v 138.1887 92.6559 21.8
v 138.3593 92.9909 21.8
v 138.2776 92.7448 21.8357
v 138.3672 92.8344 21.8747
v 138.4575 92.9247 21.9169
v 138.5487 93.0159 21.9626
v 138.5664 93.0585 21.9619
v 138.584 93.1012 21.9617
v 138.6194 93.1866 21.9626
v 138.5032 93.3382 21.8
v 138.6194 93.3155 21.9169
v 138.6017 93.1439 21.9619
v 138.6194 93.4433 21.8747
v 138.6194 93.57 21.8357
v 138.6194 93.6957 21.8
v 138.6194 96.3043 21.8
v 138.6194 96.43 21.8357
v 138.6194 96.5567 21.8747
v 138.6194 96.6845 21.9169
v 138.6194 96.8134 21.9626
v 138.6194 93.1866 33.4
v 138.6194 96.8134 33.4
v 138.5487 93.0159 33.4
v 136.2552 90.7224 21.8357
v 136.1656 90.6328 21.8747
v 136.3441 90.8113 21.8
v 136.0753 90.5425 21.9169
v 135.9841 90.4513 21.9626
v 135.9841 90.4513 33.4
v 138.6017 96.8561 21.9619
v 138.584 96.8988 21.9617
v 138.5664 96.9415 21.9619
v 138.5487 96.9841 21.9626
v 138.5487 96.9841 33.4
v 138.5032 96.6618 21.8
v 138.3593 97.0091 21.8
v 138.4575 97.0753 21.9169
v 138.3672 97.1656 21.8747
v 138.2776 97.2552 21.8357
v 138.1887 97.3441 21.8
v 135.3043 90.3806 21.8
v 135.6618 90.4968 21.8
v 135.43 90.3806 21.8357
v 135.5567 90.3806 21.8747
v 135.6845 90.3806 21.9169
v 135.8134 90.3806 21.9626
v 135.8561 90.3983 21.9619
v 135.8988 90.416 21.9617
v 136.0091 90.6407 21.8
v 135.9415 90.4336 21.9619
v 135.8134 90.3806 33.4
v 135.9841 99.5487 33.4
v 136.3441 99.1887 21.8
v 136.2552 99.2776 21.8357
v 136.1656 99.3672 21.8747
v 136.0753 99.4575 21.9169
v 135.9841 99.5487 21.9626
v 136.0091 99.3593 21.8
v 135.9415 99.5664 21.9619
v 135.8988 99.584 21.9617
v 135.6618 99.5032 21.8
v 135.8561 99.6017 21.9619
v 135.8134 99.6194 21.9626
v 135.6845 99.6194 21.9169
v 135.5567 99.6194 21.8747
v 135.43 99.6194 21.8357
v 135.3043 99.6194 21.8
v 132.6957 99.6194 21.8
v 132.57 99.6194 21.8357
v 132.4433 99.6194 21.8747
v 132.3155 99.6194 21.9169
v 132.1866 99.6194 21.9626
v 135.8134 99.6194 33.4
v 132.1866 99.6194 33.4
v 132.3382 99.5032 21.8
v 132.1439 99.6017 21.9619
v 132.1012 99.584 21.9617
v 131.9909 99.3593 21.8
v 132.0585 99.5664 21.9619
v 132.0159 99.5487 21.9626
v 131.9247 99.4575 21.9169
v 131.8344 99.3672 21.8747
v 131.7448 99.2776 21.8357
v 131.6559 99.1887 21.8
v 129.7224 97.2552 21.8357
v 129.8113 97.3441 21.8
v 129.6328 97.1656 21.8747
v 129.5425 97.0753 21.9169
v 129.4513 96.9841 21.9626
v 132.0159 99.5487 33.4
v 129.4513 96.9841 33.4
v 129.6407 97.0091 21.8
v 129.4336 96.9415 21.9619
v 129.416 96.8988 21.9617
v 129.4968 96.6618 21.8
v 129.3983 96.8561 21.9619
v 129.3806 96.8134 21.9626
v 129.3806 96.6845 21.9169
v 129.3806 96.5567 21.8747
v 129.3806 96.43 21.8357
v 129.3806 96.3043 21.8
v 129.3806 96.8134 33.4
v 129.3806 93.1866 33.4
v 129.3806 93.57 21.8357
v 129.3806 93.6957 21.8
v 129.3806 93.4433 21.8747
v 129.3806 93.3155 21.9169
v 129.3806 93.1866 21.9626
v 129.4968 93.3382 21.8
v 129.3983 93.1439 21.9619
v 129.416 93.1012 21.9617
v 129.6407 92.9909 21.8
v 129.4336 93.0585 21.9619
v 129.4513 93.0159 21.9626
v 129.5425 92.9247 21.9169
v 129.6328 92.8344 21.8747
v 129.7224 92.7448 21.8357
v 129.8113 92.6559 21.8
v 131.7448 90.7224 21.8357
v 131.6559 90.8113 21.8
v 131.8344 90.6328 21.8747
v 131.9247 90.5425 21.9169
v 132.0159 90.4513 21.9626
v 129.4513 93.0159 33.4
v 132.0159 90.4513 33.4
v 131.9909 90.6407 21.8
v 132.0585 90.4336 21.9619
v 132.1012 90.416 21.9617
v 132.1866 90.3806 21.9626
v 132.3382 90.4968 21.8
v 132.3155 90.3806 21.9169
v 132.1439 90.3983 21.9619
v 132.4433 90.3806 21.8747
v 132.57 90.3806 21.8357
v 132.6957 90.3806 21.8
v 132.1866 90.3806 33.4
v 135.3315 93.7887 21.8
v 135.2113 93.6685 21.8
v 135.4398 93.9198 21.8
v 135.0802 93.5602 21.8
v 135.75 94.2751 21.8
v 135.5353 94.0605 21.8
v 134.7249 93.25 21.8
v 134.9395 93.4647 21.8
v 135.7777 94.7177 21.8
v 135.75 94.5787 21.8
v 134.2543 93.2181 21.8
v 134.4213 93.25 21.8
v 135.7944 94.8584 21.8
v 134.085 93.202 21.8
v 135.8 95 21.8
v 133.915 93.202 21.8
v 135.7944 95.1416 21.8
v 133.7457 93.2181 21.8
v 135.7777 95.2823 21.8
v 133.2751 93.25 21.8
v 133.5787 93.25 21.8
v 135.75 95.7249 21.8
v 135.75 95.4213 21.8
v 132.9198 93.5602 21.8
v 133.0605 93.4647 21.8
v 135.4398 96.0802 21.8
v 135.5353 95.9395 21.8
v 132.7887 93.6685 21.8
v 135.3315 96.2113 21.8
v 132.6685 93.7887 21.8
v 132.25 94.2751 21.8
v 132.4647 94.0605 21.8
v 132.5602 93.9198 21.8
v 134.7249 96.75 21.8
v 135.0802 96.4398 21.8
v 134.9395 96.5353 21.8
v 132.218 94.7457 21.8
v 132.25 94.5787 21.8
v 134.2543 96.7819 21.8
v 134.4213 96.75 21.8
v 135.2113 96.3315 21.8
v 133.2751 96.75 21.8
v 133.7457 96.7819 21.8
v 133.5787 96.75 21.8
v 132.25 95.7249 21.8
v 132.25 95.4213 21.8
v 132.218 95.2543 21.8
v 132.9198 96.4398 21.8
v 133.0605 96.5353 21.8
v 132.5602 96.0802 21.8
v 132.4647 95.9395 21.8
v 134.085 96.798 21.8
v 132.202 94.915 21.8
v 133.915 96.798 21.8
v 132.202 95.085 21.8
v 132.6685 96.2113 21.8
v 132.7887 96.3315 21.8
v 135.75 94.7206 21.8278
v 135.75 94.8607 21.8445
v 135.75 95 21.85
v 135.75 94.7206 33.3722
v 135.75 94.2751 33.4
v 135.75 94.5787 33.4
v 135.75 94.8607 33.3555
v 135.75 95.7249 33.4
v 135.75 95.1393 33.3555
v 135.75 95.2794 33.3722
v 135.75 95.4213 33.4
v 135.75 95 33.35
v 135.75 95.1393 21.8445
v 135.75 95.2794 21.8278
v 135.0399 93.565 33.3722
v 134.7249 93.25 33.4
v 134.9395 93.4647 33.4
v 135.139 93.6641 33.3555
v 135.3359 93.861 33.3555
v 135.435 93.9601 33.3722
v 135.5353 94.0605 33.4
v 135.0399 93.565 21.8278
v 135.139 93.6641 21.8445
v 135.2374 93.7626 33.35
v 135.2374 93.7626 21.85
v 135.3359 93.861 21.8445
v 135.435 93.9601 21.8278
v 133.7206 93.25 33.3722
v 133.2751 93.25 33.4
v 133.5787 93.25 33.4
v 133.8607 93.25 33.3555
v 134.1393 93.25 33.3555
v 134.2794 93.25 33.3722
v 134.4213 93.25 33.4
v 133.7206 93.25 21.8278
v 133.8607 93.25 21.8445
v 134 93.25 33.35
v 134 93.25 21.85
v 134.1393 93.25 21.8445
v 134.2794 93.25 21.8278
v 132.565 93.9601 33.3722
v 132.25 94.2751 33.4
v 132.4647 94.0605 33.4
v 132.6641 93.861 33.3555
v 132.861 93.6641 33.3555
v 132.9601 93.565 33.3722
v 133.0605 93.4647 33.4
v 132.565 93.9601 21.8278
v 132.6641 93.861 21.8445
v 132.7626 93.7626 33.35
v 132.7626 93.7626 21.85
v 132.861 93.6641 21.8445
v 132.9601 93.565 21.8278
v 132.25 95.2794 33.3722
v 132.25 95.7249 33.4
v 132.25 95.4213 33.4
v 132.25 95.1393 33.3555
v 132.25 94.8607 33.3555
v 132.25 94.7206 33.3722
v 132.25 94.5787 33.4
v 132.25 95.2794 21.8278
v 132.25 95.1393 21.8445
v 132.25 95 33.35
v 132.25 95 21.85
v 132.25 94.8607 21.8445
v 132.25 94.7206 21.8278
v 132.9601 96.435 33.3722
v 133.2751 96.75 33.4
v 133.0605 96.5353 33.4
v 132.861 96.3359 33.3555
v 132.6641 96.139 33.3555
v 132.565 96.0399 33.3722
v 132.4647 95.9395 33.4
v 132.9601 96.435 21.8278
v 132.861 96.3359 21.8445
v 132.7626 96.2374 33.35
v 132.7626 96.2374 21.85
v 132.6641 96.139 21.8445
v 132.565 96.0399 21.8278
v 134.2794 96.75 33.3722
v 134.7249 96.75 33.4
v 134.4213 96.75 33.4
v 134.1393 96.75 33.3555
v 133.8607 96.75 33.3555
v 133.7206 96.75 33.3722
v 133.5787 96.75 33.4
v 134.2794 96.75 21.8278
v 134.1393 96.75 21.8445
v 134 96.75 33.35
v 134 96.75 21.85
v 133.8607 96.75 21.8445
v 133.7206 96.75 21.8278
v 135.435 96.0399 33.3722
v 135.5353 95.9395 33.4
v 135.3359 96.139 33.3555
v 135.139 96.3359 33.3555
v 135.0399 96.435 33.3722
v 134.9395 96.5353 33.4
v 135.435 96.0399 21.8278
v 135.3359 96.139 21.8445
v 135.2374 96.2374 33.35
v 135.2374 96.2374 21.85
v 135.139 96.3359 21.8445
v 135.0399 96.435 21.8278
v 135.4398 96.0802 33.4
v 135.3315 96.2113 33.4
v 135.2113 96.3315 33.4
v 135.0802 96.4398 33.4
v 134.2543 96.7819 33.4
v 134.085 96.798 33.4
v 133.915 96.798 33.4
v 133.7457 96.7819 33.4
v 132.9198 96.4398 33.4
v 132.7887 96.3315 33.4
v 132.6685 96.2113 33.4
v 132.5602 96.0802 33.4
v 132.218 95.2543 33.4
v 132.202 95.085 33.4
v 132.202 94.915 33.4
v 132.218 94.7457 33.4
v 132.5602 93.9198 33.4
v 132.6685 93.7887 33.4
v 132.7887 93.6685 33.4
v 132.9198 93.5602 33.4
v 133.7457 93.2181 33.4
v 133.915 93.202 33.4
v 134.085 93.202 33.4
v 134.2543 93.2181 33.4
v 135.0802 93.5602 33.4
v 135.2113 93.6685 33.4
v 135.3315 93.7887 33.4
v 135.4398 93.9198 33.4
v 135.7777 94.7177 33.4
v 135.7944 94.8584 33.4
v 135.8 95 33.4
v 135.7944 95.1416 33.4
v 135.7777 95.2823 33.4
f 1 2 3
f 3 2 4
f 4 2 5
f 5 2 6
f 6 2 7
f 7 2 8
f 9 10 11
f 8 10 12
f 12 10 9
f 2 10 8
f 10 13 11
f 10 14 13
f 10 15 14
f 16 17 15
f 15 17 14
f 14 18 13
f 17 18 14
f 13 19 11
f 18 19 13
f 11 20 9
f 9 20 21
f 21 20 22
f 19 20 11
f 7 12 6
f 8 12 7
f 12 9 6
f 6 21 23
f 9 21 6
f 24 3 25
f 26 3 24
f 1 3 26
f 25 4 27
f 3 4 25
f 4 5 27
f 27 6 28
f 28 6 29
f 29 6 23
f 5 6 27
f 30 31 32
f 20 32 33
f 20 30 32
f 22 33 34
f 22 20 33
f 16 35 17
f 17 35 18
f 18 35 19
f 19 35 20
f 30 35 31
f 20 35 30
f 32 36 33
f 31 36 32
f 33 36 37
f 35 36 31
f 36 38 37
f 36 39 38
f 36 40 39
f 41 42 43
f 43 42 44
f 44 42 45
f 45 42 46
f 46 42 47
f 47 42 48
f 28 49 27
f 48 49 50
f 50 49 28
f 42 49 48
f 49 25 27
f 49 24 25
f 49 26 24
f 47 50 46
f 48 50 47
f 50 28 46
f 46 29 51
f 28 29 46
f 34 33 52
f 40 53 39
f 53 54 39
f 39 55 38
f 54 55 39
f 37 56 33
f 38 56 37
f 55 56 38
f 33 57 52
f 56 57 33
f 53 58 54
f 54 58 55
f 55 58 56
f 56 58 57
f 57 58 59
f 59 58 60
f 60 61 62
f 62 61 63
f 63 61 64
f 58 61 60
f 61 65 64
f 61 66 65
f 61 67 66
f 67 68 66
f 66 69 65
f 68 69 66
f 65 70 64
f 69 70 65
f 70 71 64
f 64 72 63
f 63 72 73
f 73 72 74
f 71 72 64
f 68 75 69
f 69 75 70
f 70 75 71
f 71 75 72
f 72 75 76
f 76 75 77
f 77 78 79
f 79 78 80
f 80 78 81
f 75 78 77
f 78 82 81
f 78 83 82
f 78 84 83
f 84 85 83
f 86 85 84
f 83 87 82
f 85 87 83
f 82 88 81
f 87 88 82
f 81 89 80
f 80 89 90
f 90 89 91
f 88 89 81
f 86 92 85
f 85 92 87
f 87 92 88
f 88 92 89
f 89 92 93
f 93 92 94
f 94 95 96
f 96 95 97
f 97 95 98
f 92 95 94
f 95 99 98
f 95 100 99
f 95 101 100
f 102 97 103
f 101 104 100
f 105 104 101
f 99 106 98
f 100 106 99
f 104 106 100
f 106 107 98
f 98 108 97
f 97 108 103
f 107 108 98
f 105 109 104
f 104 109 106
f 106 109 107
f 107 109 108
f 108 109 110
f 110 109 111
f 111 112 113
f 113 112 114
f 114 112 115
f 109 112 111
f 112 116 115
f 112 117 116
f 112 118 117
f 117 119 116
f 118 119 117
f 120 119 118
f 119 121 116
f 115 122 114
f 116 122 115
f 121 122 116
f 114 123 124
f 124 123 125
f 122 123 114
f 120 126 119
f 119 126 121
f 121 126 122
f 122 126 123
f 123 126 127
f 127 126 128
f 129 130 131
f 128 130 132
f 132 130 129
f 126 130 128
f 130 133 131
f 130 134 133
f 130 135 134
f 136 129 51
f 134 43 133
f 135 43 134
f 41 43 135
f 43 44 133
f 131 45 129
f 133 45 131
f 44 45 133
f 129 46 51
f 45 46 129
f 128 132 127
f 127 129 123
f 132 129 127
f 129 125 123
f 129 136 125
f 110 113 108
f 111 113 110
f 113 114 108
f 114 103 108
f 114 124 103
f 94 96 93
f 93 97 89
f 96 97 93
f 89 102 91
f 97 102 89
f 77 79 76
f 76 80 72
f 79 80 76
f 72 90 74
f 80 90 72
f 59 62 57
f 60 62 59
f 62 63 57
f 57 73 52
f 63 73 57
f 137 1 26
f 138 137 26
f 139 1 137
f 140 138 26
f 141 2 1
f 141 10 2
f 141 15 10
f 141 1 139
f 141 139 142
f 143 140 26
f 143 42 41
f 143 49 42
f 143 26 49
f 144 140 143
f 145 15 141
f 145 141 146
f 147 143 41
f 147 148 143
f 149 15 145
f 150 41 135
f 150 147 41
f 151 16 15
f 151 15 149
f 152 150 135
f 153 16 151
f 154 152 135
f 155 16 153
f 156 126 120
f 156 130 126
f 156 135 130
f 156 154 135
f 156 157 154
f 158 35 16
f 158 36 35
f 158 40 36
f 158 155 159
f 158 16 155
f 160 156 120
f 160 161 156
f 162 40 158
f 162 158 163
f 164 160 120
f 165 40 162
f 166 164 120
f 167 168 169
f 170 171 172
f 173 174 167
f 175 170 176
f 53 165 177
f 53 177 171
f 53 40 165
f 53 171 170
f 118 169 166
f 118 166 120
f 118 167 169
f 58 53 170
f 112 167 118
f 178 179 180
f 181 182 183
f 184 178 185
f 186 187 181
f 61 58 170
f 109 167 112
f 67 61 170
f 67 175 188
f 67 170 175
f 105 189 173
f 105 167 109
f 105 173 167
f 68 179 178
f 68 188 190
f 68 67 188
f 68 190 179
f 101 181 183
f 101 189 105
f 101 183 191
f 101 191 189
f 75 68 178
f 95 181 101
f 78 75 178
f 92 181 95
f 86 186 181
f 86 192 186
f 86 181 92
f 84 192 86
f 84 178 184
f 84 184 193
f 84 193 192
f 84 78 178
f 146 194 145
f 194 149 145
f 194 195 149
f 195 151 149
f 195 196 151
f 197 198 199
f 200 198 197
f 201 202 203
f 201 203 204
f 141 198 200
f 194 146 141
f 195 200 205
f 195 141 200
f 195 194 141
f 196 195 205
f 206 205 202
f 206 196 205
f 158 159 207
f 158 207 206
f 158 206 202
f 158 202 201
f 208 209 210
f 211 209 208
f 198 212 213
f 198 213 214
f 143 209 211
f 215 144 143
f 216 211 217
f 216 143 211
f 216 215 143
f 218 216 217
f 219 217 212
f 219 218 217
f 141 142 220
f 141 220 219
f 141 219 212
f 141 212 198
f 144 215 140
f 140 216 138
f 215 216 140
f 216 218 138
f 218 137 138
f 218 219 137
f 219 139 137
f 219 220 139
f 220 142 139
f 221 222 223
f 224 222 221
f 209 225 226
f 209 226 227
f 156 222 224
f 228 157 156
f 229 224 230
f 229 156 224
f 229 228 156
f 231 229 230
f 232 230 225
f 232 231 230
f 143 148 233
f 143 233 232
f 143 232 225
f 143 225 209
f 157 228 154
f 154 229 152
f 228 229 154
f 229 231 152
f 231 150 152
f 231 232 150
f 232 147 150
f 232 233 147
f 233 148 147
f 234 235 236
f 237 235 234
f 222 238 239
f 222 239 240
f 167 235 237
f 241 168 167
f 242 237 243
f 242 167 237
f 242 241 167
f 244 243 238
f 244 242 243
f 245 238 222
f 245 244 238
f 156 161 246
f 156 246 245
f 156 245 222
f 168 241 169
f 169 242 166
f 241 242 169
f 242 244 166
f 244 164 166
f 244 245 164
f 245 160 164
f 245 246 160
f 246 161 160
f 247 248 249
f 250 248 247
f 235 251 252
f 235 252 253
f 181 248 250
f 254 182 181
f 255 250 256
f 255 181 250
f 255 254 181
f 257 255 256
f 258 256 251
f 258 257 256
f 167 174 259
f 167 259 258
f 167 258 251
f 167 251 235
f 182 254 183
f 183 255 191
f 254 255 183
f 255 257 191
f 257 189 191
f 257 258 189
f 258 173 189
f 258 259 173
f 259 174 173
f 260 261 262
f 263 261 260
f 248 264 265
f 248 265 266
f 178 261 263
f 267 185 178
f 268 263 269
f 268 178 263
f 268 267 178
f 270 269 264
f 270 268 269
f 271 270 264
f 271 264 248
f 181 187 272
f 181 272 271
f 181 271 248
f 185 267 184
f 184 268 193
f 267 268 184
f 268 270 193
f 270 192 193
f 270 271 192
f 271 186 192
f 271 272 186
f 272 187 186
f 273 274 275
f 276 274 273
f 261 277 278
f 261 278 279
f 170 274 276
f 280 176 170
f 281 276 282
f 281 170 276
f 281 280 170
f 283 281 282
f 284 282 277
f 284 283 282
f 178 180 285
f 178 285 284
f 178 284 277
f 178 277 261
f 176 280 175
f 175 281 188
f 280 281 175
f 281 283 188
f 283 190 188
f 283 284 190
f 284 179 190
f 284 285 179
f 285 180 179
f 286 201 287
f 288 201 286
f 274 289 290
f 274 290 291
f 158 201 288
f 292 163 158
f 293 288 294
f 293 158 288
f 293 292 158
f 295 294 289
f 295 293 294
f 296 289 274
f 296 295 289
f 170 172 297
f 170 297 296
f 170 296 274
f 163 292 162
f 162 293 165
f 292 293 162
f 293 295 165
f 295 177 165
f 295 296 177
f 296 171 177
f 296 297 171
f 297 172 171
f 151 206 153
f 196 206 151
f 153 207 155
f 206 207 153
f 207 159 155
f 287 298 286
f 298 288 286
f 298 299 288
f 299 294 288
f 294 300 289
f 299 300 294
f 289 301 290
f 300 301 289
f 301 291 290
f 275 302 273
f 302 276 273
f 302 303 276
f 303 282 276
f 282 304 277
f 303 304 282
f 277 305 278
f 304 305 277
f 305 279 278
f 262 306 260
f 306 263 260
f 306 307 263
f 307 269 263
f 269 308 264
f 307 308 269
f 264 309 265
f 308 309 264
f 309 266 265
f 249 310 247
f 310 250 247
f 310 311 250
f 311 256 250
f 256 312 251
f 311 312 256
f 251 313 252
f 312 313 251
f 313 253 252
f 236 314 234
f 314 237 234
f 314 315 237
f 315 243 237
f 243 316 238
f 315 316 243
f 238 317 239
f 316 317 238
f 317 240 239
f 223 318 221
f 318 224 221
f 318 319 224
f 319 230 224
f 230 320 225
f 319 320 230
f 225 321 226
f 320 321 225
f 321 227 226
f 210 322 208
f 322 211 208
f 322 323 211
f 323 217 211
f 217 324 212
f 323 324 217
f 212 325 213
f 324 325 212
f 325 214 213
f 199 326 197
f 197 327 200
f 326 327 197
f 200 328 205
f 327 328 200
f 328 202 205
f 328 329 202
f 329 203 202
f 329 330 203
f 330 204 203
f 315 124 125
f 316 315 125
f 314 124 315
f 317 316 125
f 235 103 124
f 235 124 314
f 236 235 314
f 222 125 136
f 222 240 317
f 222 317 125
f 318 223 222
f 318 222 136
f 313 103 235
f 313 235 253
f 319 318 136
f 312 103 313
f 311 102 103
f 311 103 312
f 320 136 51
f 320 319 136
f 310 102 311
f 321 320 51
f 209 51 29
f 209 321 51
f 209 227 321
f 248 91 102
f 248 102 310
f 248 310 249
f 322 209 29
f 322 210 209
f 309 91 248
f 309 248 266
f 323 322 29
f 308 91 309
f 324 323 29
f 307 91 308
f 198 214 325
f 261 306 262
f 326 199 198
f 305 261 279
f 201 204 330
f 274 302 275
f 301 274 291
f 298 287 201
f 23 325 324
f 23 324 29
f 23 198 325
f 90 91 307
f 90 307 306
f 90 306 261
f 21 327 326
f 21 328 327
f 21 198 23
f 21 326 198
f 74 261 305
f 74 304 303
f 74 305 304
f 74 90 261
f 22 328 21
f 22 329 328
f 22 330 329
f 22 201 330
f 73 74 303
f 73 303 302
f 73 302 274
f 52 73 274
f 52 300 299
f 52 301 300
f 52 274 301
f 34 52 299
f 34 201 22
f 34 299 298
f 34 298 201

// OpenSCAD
// Generated by the canonical parent Python sources and validated exchange pipeline.
polyhedron(points=[[138.1886749267578, 92.6558609008789, 21.799999237060547], [138.35928344726562, 92.9908676147461, 21.799999237060547], [138.277587890625, 92.7447738647461, 21.83568000793457], [138.3671875, 92.83436584472656, 21.874652862548828], [138.45753479003906, 92.92471313476562, 21.916948318481445], [138.54869079589844, 93.015869140625, 21.96259117126465], [138.5663604736328, 93.05854797363281, 21.961946487426758], [138.58404541015625, 93.10122680664062, 21.96173095703125], [138.61940002441406, 93.18658447265625, 21.96259117126465], [138.50315856933594, 93.33818817138672, 21.799999237060547], [138.61940002441406, 93.31549835205078, 21.916948318481445], [138.60171508789062, 93.14390563964844, 21.961946487426758], [138.61940002441406, 93.44326782226562, 21.874652862548828], [138.61940002441406, 93.56997680664062, 21.83568000793457], [138.61940002441406, 93.69570922851562, 21.799999237060547], [138.61940002441406, 96.30429077148438, 21.799999237060547], [138.61940002441406, 96.43002319335938, 21.83568000793457], [138.61940002441406, 96.55673217773438, 21.874652862548828], [138.61940002441406, 96.68450164794922, 21.916948318481445], [138.61940002441406, 96.81341552734375, 21.96259117126465], [138.61940002441406, 93.18658447265625, 33.400001525878906], [138.61940002441406, 96.81341552734375, 33.400001525878906], [138.54869079589844, 93.015869140625, 33.400001525878906], [136.25523376464844, 90.722412109375, 21.83568000793457], [136.16563415527344, 90.63282012939453, 21.874652862548828], [136.34413146972656, 90.81132507324219, 21.799999237060547], [136.07528686523438, 90.54247283935547, 21.916948318481445], [135.984130859375, 90.45130920410156, 21.96259117126465], [135.984130859375, 90.45130920410156, 33.400001525878906], [138.60171508789062, 96.85609436035156, 21.961946487426758], [138.58404541015625, 96.89877319335938, 21.96173095703125], [138.5663604736328, 96.94145202636719, 21.961946487426758], [138.54869079589844, 96.984130859375, 21.96259117126465], [138.54869079589844, 96.984130859375, 33.400001525878906], [138.50315856933594, 96.66181182861328, 21.799999237060547], [138.35928344726562, 97.0091323852539, 21.799999237060547], [138.45753479003906, 97.07528686523438, 21.916948318481445], [138.3671875, 97.16563415527344, 21.874652862548828], [138.277587890625, 97.2552261352539, 21.83568000793457], [138.1886749267578, 97.3441390991211, 21.799999237060547], [135.30429077148438, 90.38059997558594, 21.799999237060547], [135.66180419921875, 90.4968490600586, 21.799999237060547], [135.43002319335938, 90.38059997558594, 21.83568000793457], [135.55673217773438, 90.38059997558594, 21.874652862548828], [135.6844940185547, 90.38059997558594, 21.916948318481445], [135.81341552734375, 90.38059997558594, 21.96259117126465], [135.85609436035156, 90.39827728271484, 21.961946487426758], [135.89877319335938, 90.41595458984375, 21.96173095703125], [136.00914001464844, 90.64071655273438, 21.799999237060547], [135.9414520263672, 90.43363189697266, 21.961946487426758], [135.81341552734375, 90.38059997558594, 33.400001525878906], [135.984130859375, 99.54869079589844, 33.400001525878906], [136.34413146972656, 99.18867492675781, 21.799999237060547], [136.25523376464844, 99.277587890625, 21.83568000793457], [136.16563415527344, 99.36717987060547, 21.874652862548828], [136.07528686523438, 99.45752716064453, 21.916948318481445], [135.984130859375, 99.54869079589844, 21.96259117126465], [136.00914001464844, 99.35928344726562, 21.799999237060547], [135.9414520263672, 99.56636810302734, 21.961946487426758], [135.89877319335938, 99.58404541015625, 21.96173095703125], [135.66180419921875, 99.5031509399414, 21.799999237060547], [135.85609436035156, 99.60172271728516, 21.961946487426758], [135.81341552734375, 99.61940002441406, 21.96259117126465], [135.6844940185547, 99.61940002441406, 21.916948318481445], [135.55673217773438, 99.61940002441406, 21.874652862548828], [135.43002319335938, 99.61940002441406, 21.83568000793457], [135.30429077148438, 99.61940002441406, 21.799999237060547], [132.69570922851562, 99.61940002441406, 21.799999237060547], [132.56997680664062, 99.61940002441406, 21.83568000793457], [132.44326782226562, 99.61940002441406, 21.874652862548828], [132.3155059814453, 99.61940002441406, 21.916948318481445], [132.18658447265625, 99.61940002441406, 21.96259117126465], [135.81341552734375, 99.61940002441406, 33.400001525878906], [132.18658447265625, 99.61940002441406, 33.400001525878906], [132.33819580078125, 99.5031509399414, 21.799999237060547], [132.14390563964844, 99.60172271728516, 21.961946487426758], [132.10122680664062, 99.58404541015625, 21.96173095703125], [131.99085998535156, 99.35928344726562, 21.799999237060547], [132.0585479736328, 99.56636810302734, 21.961946487426758], [132.015869140625, 99.54869079589844, 21.96259117126465], [131.92471313476562, 99.45752716064453, 21.916948318481445], [131.83436584472656, 99.36717987060547, 21.874652862548828], [131.74476623535156, 99.277587890625, 21.83568000793457], [131.65586853027344, 99.18867492675781, 21.799999237060547], [129.722412109375, 97.2552261352539, 21.83568000793457], [129.8113250732422, 97.3441390991211, 21.799999237060547], [129.6328125, 97.16563415527344, 21.874652862548828], [129.54246520996094, 97.07528686523438, 21.916948318481445], [129.45130920410156, 96.984130859375, 21.96259117126465], [132.015869140625, 99.54869079589844, 33.400001525878906], [129.45130920410156, 96.984130859375, 33.400001525878906], [129.64071655273438, 97.0091323852539, 21.799999237060547], [129.4336395263672, 96.94145202636719, 21.961946487426758], [129.41595458984375, 96.89877319335938, 21.96173095703125], [129.49684143066406, 96.66181182861328, 21.799999237060547], [129.39828491210938, 96.85609436035156, 21.961946487426758], [129.38059997558594, 96.81341552734375, 21.96259117126465], [129.38059997558594, 96.68450164794922, 21.916948318481445], [129.38059997558594, 96.55673217773438, 21.874652862548828], [129.38059997558594, 96.43002319335938, 21.83568000793457], [129.38059997558594, 96.30429077148438, 21.799999237060547], [129.38059997558594, 96.81341552734375, 33.400001525878906], [129.38059997558594, 93.18658447265625, 33.400001525878906], [129.38059997558594, 93.56997680664062, 21.83568000793457], [129.38059997558594, 93.69570922851562, 21.799999237060547], [129.38059997558594, 93.44326782226562, 21.874652862548828], [129.38059997558594, 93.31549835205078, 21.916948318481445], [129.38059997558594, 93.18658447265625, 21.96259117126465], [129.49684143066406, 93.33818817138672, 21.799999237060547], [129.39828491210938, 93.14390563964844, 21.961946487426758], [129.41595458984375, 93.10122680664062, 21.96173095703125], [129.64071655273438, 92.9908676147461, 21.799999237060547], [129.4336395263672, 93.05854797363281, 21.961946487426758], [129.45130920410156, 93.015869140625, 21.96259117126465], [129.54246520996094, 92.92471313476562, 21.916948318481445], [129.6328125, 92.83436584472656, 21.874652862548828], [129.722412109375, 92.7447738647461, 21.83568000793457], [129.8113250732422, 92.6558609008789, 21.799999237060547], [131.74476623535156, 90.722412109375, 21.83568000793457], [131.65586853027344, 90.81132507324219, 21.799999237060547], [131.83436584472656, 90.63282012939453, 21.874652862548828], [131.92471313476562, 90.54247283935547, 21.916948318481445], [132.015869140625, 90.45130920410156, 21.96259117126465], [129.45130920410156, 93.015869140625, 33.400001525878906], [132.015869140625, 90.45130920410156, 33.400001525878906], [131.99085998535156, 90.64071655273438, 21.799999237060547], [132.0585479736328, 90.43363189697266, 21.961946487426758], [132.10122680664062, 90.41595458984375, 21.96173095703125], [132.18658447265625, 90.38059997558594, 21.96259117126465], [132.33819580078125, 90.4968490600586, 21.799999237060547], [132.3155059814453, 90.38059997558594, 21.916948318481445], [132.14390563964844, 90.39827728271484, 21.961946487426758], [132.44326782226562, 90.38059997558594, 21.874652862548828], [132.56997680664062, 90.38059997558594, 21.83568000793457], [132.69570922851562, 90.38059997558594, 21.799999237060547], [132.18658447265625, 90.38059997558594, 33.400001525878906], [135.33148193359375, 93.78874206542969, 21.799999237060547], [135.2112579345703, 93.66851043701172, 21.799999237060547], [135.43983459472656, 93.91979217529297, 21.799999237060547], [135.08021545410156, 93.5601577758789, 21.799999237060547], [135.75, 94.2751235961914, 21.799999237060547], [135.53533935546875, 94.06047058105469, 21.799999237060547], [134.72486877441406, 93.25, 21.799999237060547], [134.9395294189453, 93.46465301513672, 21.799999237060547], [135.77772521972656, 94.71766662597656, 21.799999237060547], [135.75, 94.57868957519531, 21.799999237060547], [134.25430297851562, 93.21805572509766, 21.799999237060547], [134.4213104248047, 93.25, 21.799999237060547], [135.79441833496094, 94.8583984375, 21.799999237060547], [134.08502197265625, 93.20201110839844, 21.799999237060547], [135.8000030517578, 95.0, 21.799999237060547], [133.91497802734375, 93.20201110839844, 21.799999237060547], [135.79441833496094, 95.1416015625, 21.799999237060547], [133.74569702148438, 93.21805572509766, 21.799999237060547], [135.77772521972656, 95.28233337402344, 21.799999237060547], [133.27513122558594, 93.25, 21.799999237060547], [133.5786895751953, 93.25, 21.799999237060547], [135.75, 95.7248764038086, 21.799999237060547], [135.75, 95.42131042480469, 21.799999237060547], [132.91978454589844, 93.5601577758789, 21.799999237060547], [133.0604705810547, 93.46465301513672, 21.799999237060547], [135.43983459472656, 96.08020782470703, 21.799999237060547], [135.53533935546875, 95.93952941894531, 21.799999237060547], [132.7887420654297, 93.66851043701172, 21.799999237060547], [135.33148193359375, 96.21125793457031, 21.799999237060547], [132.66851806640625, 93.78874206542969, 21.799999237060547], [132.25, 94.2751235961914, 21.799999237060547], [132.46466064453125, 94.06047058105469, 21.799999237060547], [132.56016540527344, 93.91979217529297, 21.799999237060547], [134.72486877441406, 96.75, 21.799999237060547], [135.08021545410156, 96.4398422241211, 21.799999237060547], [134.9395294189453, 96.53534698486328, 21.799999237060547], [132.21804809570312, 94.7457046508789, 21.799999237060547], [132.25, 94.57868957519531, 21.799999237060547], [134.25430297851562, 96.78194427490234, 21.799999237060547], [134.4213104248047, 96.75, 21.799999237060547], [135.2112579345703, 96.33148956298828, 21.799999237060547], [133.27513122558594, 96.75, 21.799999237060547], [133.74569702148438, 96.78194427490234, 21.799999237060547], [133.5786895751953, 96.75, 21.799999237060547], [132.25, 95.7248764038086, 21.799999237060547], [132.25, 95.42131042480469, 21.799999237060547], [132.21804809570312, 95.2542953491211, 21.799999237060547], [132.91978454589844, 96.4398422241211, 21.799999237060547], [133.0604705810547, 96.53534698486328, 21.799999237060547], [132.56016540527344, 96.08020782470703, 21.799999237060547], [132.46466064453125, 95.93952941894531, 21.799999237060547], [134.08502197265625, 96.79798889160156, 21.799999237060547], [132.20201110839844, 94.91497802734375, 21.799999237060547], [133.91497802734375, 96.79798889160156, 21.799999237060547], [132.20201110839844, 95.08502197265625, 21.799999237060547], [132.66851806640625, 96.21125793457031, 21.799999237060547], [132.7887420654297, 96.33148956298828, 21.799999237060547], [135.75, 94.72059631347656, 21.827836990356445], [135.75, 94.8607406616211, 21.844467163085938], [135.75, 95.0, 21.850000381469727], [135.75, 94.72059631347656, 33.37216567993164], [135.75, 94.2751235961914, 33.400001525878906], [135.75, 94.57868957519531, 33.400001525878906], [135.75, 94.8607406616211, 33.355533599853516], [135.75, 95.7248764038086, 33.400001525878906], [135.75, 95.1392593383789, 33.355533599853516], [135.75, 95.27940368652344, 33.37216567993164], [135.75, 95.42131042480469, 33.400001525878906], [135.75, 95.0, 33.349998474121094], [135.75, 95.1392593383789, 21.844467163085938], [135.75, 95.27940368652344, 21.827836990356445], [135.0398712158203, 93.56499481201172, 33.37216567993164], [134.72486877441406, 93.25, 33.400001525878906], [134.9395294189453, 93.46465301513672, 33.400001525878906], [135.1389617919922, 93.66409301757812, 33.355533599853516], [135.33590698242188, 93.86103820800781, 33.355533599853516], [135.43499755859375, 93.96012878417969, 33.37216567993164], [135.53533935546875, 94.06047058105469, 33.400001525878906], [135.0398712158203, 93.56499481201172, 21.827836990356445], [135.1389617919922, 93.66409301757812, 21.844467163085938], [135.23744201660156, 93.76256561279297, 33.349998474121094], [135.23744201660156, 93.76256561279297, 21.850000381469727], [135.33590698242188, 93.86103820800781, 21.844467163085938], [135.43499755859375, 93.96012878417969, 21.827836990356445], [133.72059631347656, 93.25, 33.37216567993164], [133.27513122558594, 93.25, 33.400001525878906], [133.5786895751953, 93.25, 33.400001525878906], [133.86073303222656, 93.25, 33.355533599853516], [134.13926696777344, 93.25, 33.355533599853516], [134.27940368652344, 93.25, 33.37216567993164], [134.4213104248047, 93.25, 33.400001525878906], [133.72059631347656, 93.25, 21.827836990356445], [133.86073303222656, 93.25, 21.844467163085938], [134.0, 93.25, 33.349998474121094], [134.0, 93.25, 21.850000381469727], [134.13926696777344, 93.25, 21.844467163085938], [134.27940368652344, 93.25, 21.827836990356445], [132.56500244140625, 93.96012878417969, 33.37216567993164], [132.25, 94.2751235961914, 33.400001525878906], [132.46466064453125, 94.06047058105469, 33.400001525878906], [132.66409301757812, 93.86103820800781, 33.355533599853516], [132.8610382080078, 93.66409301757812, 33.355533599853516], [132.9601287841797, 93.56499481201172, 33.37216567993164], [133.0604705810547, 93.46465301513672, 33.400001525878906], [132.56500244140625, 93.96012878417969, 21.827836990356445], [132.66409301757812, 93.86103820800781, 21.844467163085938], [132.76255798339844, 93.76256561279297, 33.349998474121094], [132.76255798339844, 93.76256561279297, 21.850000381469727], [132.8610382080078, 93.66409301757812, 21.844467163085938], [132.9601287841797, 93.56499481201172, 21.827836990356445], [132.25, 95.27940368652344, 33.37216567993164], [132.25, 95.7248764038086, 33.400001525878906], [132.25, 95.42131042480469, 33.400001525878906], [132.25, 95.1392593383789, 33.355533599853516], [132.25, 94.8607406616211, 33.355533599853516], [132.25, 94.72059631347656, 33.37216567993164], [132.25, 94.57868957519531, 33.400001525878906], [132.25, 95.27940368652344, 21.827836990356445], [132.25, 95.1392593383789, 21.844467163085938], [132.25, 95.0, 33.349998474121094], [132.25, 95.0, 21.850000381469727], [132.25, 94.8607406616211, 21.844467163085938], [132.25, 94.72059631347656, 21.827836990356445], [132.9601287841797, 96.43500518798828, 33.37216567993164], [133.27513122558594, 96.75, 33.400001525878906], [133.0604705810547, 96.53534698486328, 33.400001525878906], [132.8610382080078, 96.33590698242188, 33.355533599853516], [132.66409301757812, 96.13896179199219, 33.355533599853516], [132.56500244140625, 96.03987121582031, 33.37216567993164], [132.46466064453125, 95.93952941894531, 33.400001525878906], [132.9601287841797, 96.43500518798828, 21.827836990356445], [132.8610382080078, 96.33590698242188, 21.844467163085938], [132.76255798339844, 96.23743438720703, 33.349998474121094], [132.76255798339844, 96.23743438720703, 21.850000381469727], [132.66409301757812, 96.13896179199219, 21.844467163085938], [132.56500244140625, 96.03987121582031, 21.827836990356445], [134.27940368652344, 96.75, 33.37216567993164], [134.72486877441406, 96.75, 33.400001525878906], [134.4213104248047, 96.75, 33.400001525878906], [134.13926696777344, 96.75, 33.355533599853516], [133.86073303222656, 96.75, 33.355533599853516], [133.72059631347656, 96.75, 33.37216567993164], [133.5786895751953, 96.75, 33.400001525878906], [134.27940368652344, 96.75, 21.827836990356445], [134.13926696777344, 96.75, 21.844467163085938], [134.0, 96.75, 33.349998474121094], [134.0, 96.75, 21.850000381469727], [133.86073303222656, 96.75, 21.844467163085938], [133.72059631347656, 96.75, 21.827836990356445], [135.43499755859375, 96.03987121582031, 33.37216567993164], [135.53533935546875, 95.93952941894531, 33.400001525878906], [135.33590698242188, 96.13896179199219, 33.355533599853516], [135.1389617919922, 96.33590698242188, 33.355533599853516], [135.0398712158203, 96.43500518798828, 33.37216567993164], [134.9395294189453, 96.53534698486328, 33.400001525878906], [135.43499755859375, 96.03987121582031, 21.827836990356445], [135.33590698242188, 96.13896179199219, 21.844467163085938], [135.23744201660156, 96.23743438720703, 33.349998474121094], [135.23744201660156, 96.23743438720703, 21.850000381469727], [135.1389617919922, 96.33590698242188, 21.844467163085938], [135.0398712158203, 96.43500518798828, 21.827836990356445], [135.43983459472656, 96.08020782470703, 33.400001525878906], [135.33148193359375, 96.21125793457031, 33.400001525878906], [135.2112579345703, 96.33148956298828, 33.400001525878906], [135.08021545410156, 96.4398422241211, 33.400001525878906], [134.25430297851562, 96.78194427490234, 33.400001525878906], [134.08502197265625, 96.79798889160156, 33.400001525878906], [133.91497802734375, 96.79798889160156, 33.400001525878906], [133.74569702148438, 96.78194427490234, 33.400001525878906], [132.91978454589844, 96.4398422241211, 33.400001525878906], [132.7887420654297, 96.33148956298828, 33.400001525878906], [132.66851806640625, 96.21125793457031, 33.400001525878906], [132.56016540527344, 96.08020782470703, 33.400001525878906], [132.21804809570312, 95.2542953491211, 33.400001525878906], [132.20201110839844, 95.08502197265625, 33.400001525878906], [132.20201110839844, 94.91497802734375, 33.400001525878906], [132.21804809570312, 94.7457046508789, 33.400001525878906], [132.56016540527344, 93.91979217529297, 33.400001525878906], [132.66851806640625, 93.78874206542969, 33.400001525878906], [132.7887420654297, 93.66851043701172, 33.400001525878906], [132.91978454589844, 93.5601577758789, 33.400001525878906], [133.74569702148438, 93.21805572509766, 33.400001525878906], [133.91497802734375, 93.20201110839844, 33.400001525878906], [134.08502197265625, 93.20201110839844, 33.400001525878906], [134.25430297851562, 93.21805572509766, 33.400001525878906], [135.08021545410156, 93.5601577758789, 33.400001525878906], [135.2112579345703, 93.66851043701172, 33.400001525878906], [135.33148193359375, 93.78874206542969, 33.400001525878906], [135.43983459472656, 93.91979217529297, 33.400001525878906], [135.77772521972656, 94.71766662597656, 33.400001525878906], [135.79441833496094, 94.8583984375, 33.400001525878906], [135.8000030517578, 95.0, 33.400001525878906], [135.79441833496094, 95.1416015625, 33.400001525878906], [135.77772521972656, 95.28233337402344, 33.400001525878906]],faces=[[2, 1, 0], [3, 1, 2], [4, 1, 3], [5, 1, 4], [6, 1, 5], [7, 1, 6], [10, 9, 8], [11, 9, 7], [8, 9, 11], [7, 9, 1], [10, 12, 9], [12, 13, 9], [13, 14, 9], [14, 16, 15], [13, 16, 14], [12, 17, 13], [13, 17, 16], [10, 18, 12], [12, 18, 17], [8, 19, 10], [20, 19, 8], [21, 19, 20], [10, 19, 18], [5, 11, 6], [6, 11, 7], [5, 8, 11], [22, 20, 5], [5, 20, 8], [24, 2, 23], [23, 2, 25], [25, 2, 0], [26, 3, 24], [24, 3, 2], [26, 4, 3], [27, 5, 26], [28, 5, 27], [22, 5, 28], [26, 5, 4], [31, 30, 29], [32, 31, 19], [31, 29, 19], [33, 32, 21], [32, 19, 21], [16, 34, 15], [17, 34, 16], [18, 34, 17], [19, 34, 18], [30, 34, 29], [29, 34, 19], [32, 35, 31], [31, 35, 30], [36, 35, 32], [30, 35, 34], [36, 37, 35], [37, 38, 35], [38, 39, 35], [42, 41, 40], [43, 41, 42], [44, 41, 43], [45, 41, 44], [46, 41, 45], [47, 41, 46], [26, 48, 27], [49, 48, 47], [27, 48, 49], [47, 48, 41], [26, 24, 48], [24, 23, 48], [23, 25, 48], [45, 49, 46], [46, 49, 47], [45, 27, 49], [50, 28, 45], [45, 28, 27], [51, 32, 33], [38, 52, 39], [38, 53, 52], [37, 54, 38], [38, 54, 53], [32, 55, 36], [36, 55, 37], [37, 55, 54], [51, 56, 32], [32, 56, 55], [53, 57, 52], [54, 57, 53], [55, 57, 54], [56, 57, 55], [58, 57, 56], [59, 57, 58], [61, 60, 59], [62, 60, 61], [63, 60, 62], [59, 60, 57], [63, 64, 60], [64, 65, 60], [65, 66, 60], [65, 67, 66], [64, 68, 65], [65, 68, 67], [63, 69, 64], [64, 69, 68], [63, 70, 69], [62, 71, 63], [72, 71, 62], [73, 71, 72], [63, 71, 70], [68, 74, 67], [69, 74, 68], [70, 74, 69], [71, 74, 70], [75, 74, 71], [76, 74, 75], [78, 77, 76], [79, 77, 78], [80, 77, 79], [76, 77, 74], [80, 81, 77], [81, 82, 77], [82, 83, 77], [82, 84, 83], [83, 84, 85], [81, 86, 82], [82, 86, 84], [80, 87, 81], [81, 87, 86], [79, 88, 80], [89, 88, 79], [90, 88, 89], [80, 88, 87], [84, 91, 85], [86, 91, 84], [87, 91, 86], [88, 91, 87], [92, 91, 88], [93, 91, 92], [95, 94, 93], [96, 94, 95], [97, 94, 96], [93, 94, 91], [97, 98, 94], [98, 99, 94], [99, 100, 94], [102, 96, 101], [99, 103, 100], [100, 103, 104], [97, 105, 98], [98, 105, 99], [99, 105, 103], [97, 106, 105], [96, 107, 97], [102, 107, 96], [97, 107, 106], [103, 108, 104], [105, 108, 103], [106, 108, 105], [107, 108, 106], [109, 108, 107], [110, 108, 109], [112, 111, 110], [113, 111, 112], [114, 111, 113], [110, 111, 108], [114, 115, 111], [115, 116, 111], [116, 117, 111], [115, 118, 116], [116, 118, 117], [117, 118, 119], [115, 120, 118], [113, 121, 114], [114, 121, 115], [115, 121, 120], [123, 122, 113], [124, 122, 123], [113, 122, 121], [118, 125, 119], [120, 125, 118], [121, 125, 120], [122, 125, 121], [126, 125, 122], [127, 125, 126], [130, 129, 128], [131, 129, 127], [128, 129, 131], [127, 129, 125], [130, 132, 129], [132, 133, 129], [133, 134, 129], [50, 128, 135], [132, 42, 133], [133, 42, 134], [134, 42, 40], [132, 43, 42], [128, 44, 130], [130, 44, 132], [132, 44, 43], [50, 45, 128], [128, 45, 44], [126, 131, 127], [122, 128, 126], [126, 128, 131], [122, 124, 128], [124, 135, 128], [107, 112, 109], [109, 112, 110], [107, 113, 112], [107, 102, 113], [102, 123, 113], [92, 95, 93], [88, 96, 92], [92, 96, 95], [90, 101, 88], [88, 101, 96], [75, 78, 76], [71, 79, 75], [75, 79, 78], [73, 89, 71], [71, 89, 79], [56, 61, 58], [58, 61, 59], [56, 62, 61], [51, 72, 56], [56, 72, 62], [25, 0, 136], [25, 136, 137], [136, 0, 138], [25, 137, 139], [0, 1, 140], [1, 9, 140], [9, 14, 140], [138, 0, 140], [141, 138, 140], [25, 139, 142], [40, 41, 142], [41, 48, 142], [48, 25, 142], [142, 139, 143], [140, 14, 144], [145, 140, 144], [40, 142, 146], [142, 147, 146], [144, 14, 148], [134, 40, 149], [40, 146, 149], [14, 15, 150], [148, 14, 150], [134, 149, 151], [150, 15, 152], [134, 151, 153], [152, 15, 154], [119, 125, 155], [125, 129, 155], [129, 134, 155], [134, 153, 155], [153, 156, 155], [15, 34, 157], [34, 35, 157], [35, 39, 157], [158, 154, 157], [154, 15, 157], [119, 155, 159], [155, 160, 159], [157, 39, 161], [162, 157, 161], [119, 159, 163], [161, 39, 164], [119, 163, 165], [168, 167, 166], [171, 170, 169], [166, 173, 172], [175, 169, 174], [176, 164, 52], [170, 176, 52], [164, 39, 52], [169, 170, 52], [165, 168, 117], [119, 165, 117], [168, 166, 117], [169, 52, 57], [117, 166, 111], [179, 178, 177], [182, 181, 180], [184, 177, 183], [180, 186, 185], [169, 57, 60], [111, 166, 108], [169, 60, 66], [187, 174, 66], [174, 169, 66], [172, 188, 104], [108, 166, 104], [166, 172, 104], [177, 178, 67], [189, 187, 67], [187, 66, 67], [178, 189, 67], [182, 180, 100], [104, 188, 100], [190, 182, 100], [188, 190, 100], [177, 67, 74], [100, 180, 94], [177, 74, 77], [94, 180, 91], [180, 185, 85], [185, 191, 85], [91, 180, 85], [85, 191, 83], [183, 177, 83], [192, 183, 83], [191, 192, 83], [177, 77, 83], [144, 193, 145], [144, 148, 193], [148, 194, 193], [148, 150, 194], [150, 195, 194], [198, 197, 196], [196, 197, 199], [202, 201, 200], [203, 202, 200], [199, 197, 140], [140, 145, 193], [204, 199, 194], [199, 140, 194], [140, 193, 194], [204, 194, 195], [201, 204, 205], [204, 195, 205], [206, 158, 157], [205, 206, 157], [201, 205, 157], [200, 201, 157], [209, 208, 207], [207, 208, 210], [212, 211, 197], [213, 212, 197], [210, 208, 142], [142, 143, 214], [216, 210, 215], [210, 142, 215], [142, 214, 215], [216, 215, 217], [211, 216, 218], [216, 217, 218], [219, 141, 140], [218, 219, 140], [211, 218, 140], [197, 211, 140], [139, 214, 143], [137, 215, 139], [139, 215, 214], [137, 217, 215], [137, 136, 217], [136, 218, 217], [136, 138, 218], [138, 219, 218], [138, 141, 219], [222, 221, 220], [220, 221, 223], [225, 224, 208], [226, 225, 208], [223, 221, 155], [155, 156, 227], [229, 223, 228], [223, 155, 228], [155, 227, 228], [229, 228, 230], [224, 229, 231], [229, 230, 231], [232, 147, 142], [231, 232, 142], [224, 231, 142], [208, 224, 142], [153, 227, 156], [151, 228, 153], [153, 228, 227], [151, 230, 228], [151, 149, 230], [149, 231, 230], [149, 146, 231], [146, 232, 231], [146, 147, 232], [235, 234, 233], [233, 234, 236], [238, 237, 221], [239, 238, 221], [236, 234, 166], [166, 167, 240], [242, 236, 241], [236, 166, 241], [166, 240, 241], [237, 242, 243], [242, 241, 243], [221, 237, 244], [237, 243, 244], [245, 160, 155], [244, 245, 155], [221, 244, 155], [168, 240, 167], [165, 241, 168], [168, 241, 240], [165, 243, 241], [165, 163, 243], [163, 244, 243], [163, 159, 244], [159, 245, 244], [159, 160, 245], [248, 247, 246], [246, 247, 249], [251, 250, 234], [252, 251, 234], [249, 247, 180], [180, 181, 253], [255, 249, 254], [249, 180, 254], [180, 253, 254], [255, 254, 256], [250, 255, 257], [255, 256, 257], [258, 173, 166], [257, 258, 166], [250, 257, 166], [234, 250, 166], [182, 253, 181], [190, 254, 182], [182, 254, 253], [190, 256, 254], [190, 188, 256], [188, 257, 256], [188, 172, 257], [172, 258, 257], [172, 173, 258], [261, 260, 259], [259, 260, 262], [264, 263, 247], [265, 264, 247], [262, 260, 177], [177, 184, 266], [268, 262, 267], [262, 177, 267], [177, 266, 267], [263, 268, 269], [268, 267, 269], [263, 269, 270], [247, 263, 270], [271, 186, 180], [270, 271, 180], [247, 270, 180], [183, 266, 184], [192, 267, 183], [183, 267, 266], [192, 269, 267], [192, 191, 269], [191, 270, 269], [191, 185, 270], [185, 271, 270], [185, 186, 271], [274, 273, 272], [272, 273, 275], [277, 276, 260], [278, 277, 260], [275, 273, 169], [169, 175, 279], [281, 275, 280], [275, 169, 280], [169, 279, 280], [281, 280, 282], [276, 281, 283], [281, 282, 283], [284, 179, 177], [283, 284, 177], [276, 283, 177], [260, 276, 177], [174, 279, 175], [187, 280, 174], [174, 280, 279], [187, 282, 280], [187, 189, 282], [189, 283, 282], [189, 178, 283], [178, 284, 283], [178, 179, 284], [286, 200, 285], [285, 200, 287], [289, 288, 273], [290, 289, 273], [287, 200, 157], [157, 162, 291], [293, 287, 292], [287, 157, 292], [157, 291, 292], [288, 293, 294], [293, 292, 294], [273, 288, 295], [288, 294, 295], [296, 171, 169], [295, 296, 169], [273, 295, 169], [161, 291, 162], [164, 292, 161], [161, 292, 291], [164, 294, 292], [164, 176, 294], [176, 295, 294], [176, 170, 295], [170, 296, 295], [170, 171, 296], [152, 205, 150], [150, 205, 195], [154, 206, 152], [152, 206, 205], [154, 158, 206], [285, 297, 286], [285, 287, 297], [287, 298, 297], [287, 293, 298], [288, 299, 293], [293, 299, 298], [289, 300, 288], [288, 300, 299], [289, 290, 300], [272, 301, 274], [272, 275, 301], [275, 302, 301], [275, 281, 302], [276, 303, 281], [281, 303, 302], [277, 304, 276], [276, 304, 303], [277, 278, 304], [259, 305, 261], [259, 262, 305], [262, 306, 305], [262, 268, 306], [263, 307, 268], [268, 307, 306], [264, 308, 263], [263, 308, 307], [264, 265, 308], [246, 309, 248], [246, 249, 309], [249, 310, 309], [249, 255, 310], [250, 311, 255], [255, 311, 310], [251, 312, 250], [250, 312, 311], [251, 252, 312], [233, 313, 235], [233, 236, 313], [236, 314, 313], [236, 242, 314], [237, 315, 242], [242, 315, 314], [238, 316, 237], [237, 316, 315], [238, 239, 316], [220, 317, 222], [220, 223, 317], [223, 318, 317], [223, 229, 318], [224, 319, 229], [229, 319, 318], [225, 320, 224], [224, 320, 319], [225, 226, 320], [207, 321, 209], [207, 210, 321], [210, 322, 321], [210, 216, 322], [211, 323, 216], [216, 323, 322], [212, 324, 211], [211, 324, 323], [212, 213, 324], [196, 325, 198], [199, 326, 196], [196, 326, 325], [204, 327, 199], [199, 327, 326], [204, 201, 327], [201, 328, 327], [201, 202, 328], [202, 329, 328], [202, 203, 329], [124, 123, 314], [124, 314, 315], [314, 123, 313], [124, 315, 316], [123, 102, 234], [313, 123, 234], [313, 234, 235], [135, 124, 221], [316, 239, 221], [124, 316, 221], [221, 222, 317], [135, 221, 317], [234, 102, 312], [252, 234, 312], [135, 317, 318], [312, 102, 311], [102, 101, 310], [311, 102, 310], [50, 135, 319], [135, 318, 319], [310, 101, 309], [50, 319, 320], [28, 50, 208], [50, 320, 208], [320, 226, 208], [101, 90, 247], [309, 101, 247], [248, 309, 247], [28, 208, 321], [208, 209, 321], [247, 90, 308], [265, 247, 308], [28, 321, 322], [308, 90, 307], [28, 322, 323], [307, 90, 306], [324, 213, 197], [261, 305, 260], [197, 198, 325], [278, 260, 304], [329, 203, 200], [274, 301, 273], [290, 273, 300], [200, 286, 297], [323, 324, 22], [28, 323, 22], [324, 197, 22], [306, 90, 89], [305, 306, 89], [260, 305, 89], [325, 326, 20], [326, 327, 20], [22, 197, 20], [197, 325, 20], [304, 260, 73], [302, 303, 73], [303, 304, 73], [260, 89, 73], [20, 327, 21], [327, 328, 21], [328, 329, 21], [329, 200, 21], [302, 73, 72], [301, 302, 72], [273, 301, 72], [273, 72, 51], [298, 299, 51], [299, 300, 51], [300, 273, 51], [298, 51, 33], [21, 200, 33], [297, 298, 33], [200, 297, 33]],convexity=10);
